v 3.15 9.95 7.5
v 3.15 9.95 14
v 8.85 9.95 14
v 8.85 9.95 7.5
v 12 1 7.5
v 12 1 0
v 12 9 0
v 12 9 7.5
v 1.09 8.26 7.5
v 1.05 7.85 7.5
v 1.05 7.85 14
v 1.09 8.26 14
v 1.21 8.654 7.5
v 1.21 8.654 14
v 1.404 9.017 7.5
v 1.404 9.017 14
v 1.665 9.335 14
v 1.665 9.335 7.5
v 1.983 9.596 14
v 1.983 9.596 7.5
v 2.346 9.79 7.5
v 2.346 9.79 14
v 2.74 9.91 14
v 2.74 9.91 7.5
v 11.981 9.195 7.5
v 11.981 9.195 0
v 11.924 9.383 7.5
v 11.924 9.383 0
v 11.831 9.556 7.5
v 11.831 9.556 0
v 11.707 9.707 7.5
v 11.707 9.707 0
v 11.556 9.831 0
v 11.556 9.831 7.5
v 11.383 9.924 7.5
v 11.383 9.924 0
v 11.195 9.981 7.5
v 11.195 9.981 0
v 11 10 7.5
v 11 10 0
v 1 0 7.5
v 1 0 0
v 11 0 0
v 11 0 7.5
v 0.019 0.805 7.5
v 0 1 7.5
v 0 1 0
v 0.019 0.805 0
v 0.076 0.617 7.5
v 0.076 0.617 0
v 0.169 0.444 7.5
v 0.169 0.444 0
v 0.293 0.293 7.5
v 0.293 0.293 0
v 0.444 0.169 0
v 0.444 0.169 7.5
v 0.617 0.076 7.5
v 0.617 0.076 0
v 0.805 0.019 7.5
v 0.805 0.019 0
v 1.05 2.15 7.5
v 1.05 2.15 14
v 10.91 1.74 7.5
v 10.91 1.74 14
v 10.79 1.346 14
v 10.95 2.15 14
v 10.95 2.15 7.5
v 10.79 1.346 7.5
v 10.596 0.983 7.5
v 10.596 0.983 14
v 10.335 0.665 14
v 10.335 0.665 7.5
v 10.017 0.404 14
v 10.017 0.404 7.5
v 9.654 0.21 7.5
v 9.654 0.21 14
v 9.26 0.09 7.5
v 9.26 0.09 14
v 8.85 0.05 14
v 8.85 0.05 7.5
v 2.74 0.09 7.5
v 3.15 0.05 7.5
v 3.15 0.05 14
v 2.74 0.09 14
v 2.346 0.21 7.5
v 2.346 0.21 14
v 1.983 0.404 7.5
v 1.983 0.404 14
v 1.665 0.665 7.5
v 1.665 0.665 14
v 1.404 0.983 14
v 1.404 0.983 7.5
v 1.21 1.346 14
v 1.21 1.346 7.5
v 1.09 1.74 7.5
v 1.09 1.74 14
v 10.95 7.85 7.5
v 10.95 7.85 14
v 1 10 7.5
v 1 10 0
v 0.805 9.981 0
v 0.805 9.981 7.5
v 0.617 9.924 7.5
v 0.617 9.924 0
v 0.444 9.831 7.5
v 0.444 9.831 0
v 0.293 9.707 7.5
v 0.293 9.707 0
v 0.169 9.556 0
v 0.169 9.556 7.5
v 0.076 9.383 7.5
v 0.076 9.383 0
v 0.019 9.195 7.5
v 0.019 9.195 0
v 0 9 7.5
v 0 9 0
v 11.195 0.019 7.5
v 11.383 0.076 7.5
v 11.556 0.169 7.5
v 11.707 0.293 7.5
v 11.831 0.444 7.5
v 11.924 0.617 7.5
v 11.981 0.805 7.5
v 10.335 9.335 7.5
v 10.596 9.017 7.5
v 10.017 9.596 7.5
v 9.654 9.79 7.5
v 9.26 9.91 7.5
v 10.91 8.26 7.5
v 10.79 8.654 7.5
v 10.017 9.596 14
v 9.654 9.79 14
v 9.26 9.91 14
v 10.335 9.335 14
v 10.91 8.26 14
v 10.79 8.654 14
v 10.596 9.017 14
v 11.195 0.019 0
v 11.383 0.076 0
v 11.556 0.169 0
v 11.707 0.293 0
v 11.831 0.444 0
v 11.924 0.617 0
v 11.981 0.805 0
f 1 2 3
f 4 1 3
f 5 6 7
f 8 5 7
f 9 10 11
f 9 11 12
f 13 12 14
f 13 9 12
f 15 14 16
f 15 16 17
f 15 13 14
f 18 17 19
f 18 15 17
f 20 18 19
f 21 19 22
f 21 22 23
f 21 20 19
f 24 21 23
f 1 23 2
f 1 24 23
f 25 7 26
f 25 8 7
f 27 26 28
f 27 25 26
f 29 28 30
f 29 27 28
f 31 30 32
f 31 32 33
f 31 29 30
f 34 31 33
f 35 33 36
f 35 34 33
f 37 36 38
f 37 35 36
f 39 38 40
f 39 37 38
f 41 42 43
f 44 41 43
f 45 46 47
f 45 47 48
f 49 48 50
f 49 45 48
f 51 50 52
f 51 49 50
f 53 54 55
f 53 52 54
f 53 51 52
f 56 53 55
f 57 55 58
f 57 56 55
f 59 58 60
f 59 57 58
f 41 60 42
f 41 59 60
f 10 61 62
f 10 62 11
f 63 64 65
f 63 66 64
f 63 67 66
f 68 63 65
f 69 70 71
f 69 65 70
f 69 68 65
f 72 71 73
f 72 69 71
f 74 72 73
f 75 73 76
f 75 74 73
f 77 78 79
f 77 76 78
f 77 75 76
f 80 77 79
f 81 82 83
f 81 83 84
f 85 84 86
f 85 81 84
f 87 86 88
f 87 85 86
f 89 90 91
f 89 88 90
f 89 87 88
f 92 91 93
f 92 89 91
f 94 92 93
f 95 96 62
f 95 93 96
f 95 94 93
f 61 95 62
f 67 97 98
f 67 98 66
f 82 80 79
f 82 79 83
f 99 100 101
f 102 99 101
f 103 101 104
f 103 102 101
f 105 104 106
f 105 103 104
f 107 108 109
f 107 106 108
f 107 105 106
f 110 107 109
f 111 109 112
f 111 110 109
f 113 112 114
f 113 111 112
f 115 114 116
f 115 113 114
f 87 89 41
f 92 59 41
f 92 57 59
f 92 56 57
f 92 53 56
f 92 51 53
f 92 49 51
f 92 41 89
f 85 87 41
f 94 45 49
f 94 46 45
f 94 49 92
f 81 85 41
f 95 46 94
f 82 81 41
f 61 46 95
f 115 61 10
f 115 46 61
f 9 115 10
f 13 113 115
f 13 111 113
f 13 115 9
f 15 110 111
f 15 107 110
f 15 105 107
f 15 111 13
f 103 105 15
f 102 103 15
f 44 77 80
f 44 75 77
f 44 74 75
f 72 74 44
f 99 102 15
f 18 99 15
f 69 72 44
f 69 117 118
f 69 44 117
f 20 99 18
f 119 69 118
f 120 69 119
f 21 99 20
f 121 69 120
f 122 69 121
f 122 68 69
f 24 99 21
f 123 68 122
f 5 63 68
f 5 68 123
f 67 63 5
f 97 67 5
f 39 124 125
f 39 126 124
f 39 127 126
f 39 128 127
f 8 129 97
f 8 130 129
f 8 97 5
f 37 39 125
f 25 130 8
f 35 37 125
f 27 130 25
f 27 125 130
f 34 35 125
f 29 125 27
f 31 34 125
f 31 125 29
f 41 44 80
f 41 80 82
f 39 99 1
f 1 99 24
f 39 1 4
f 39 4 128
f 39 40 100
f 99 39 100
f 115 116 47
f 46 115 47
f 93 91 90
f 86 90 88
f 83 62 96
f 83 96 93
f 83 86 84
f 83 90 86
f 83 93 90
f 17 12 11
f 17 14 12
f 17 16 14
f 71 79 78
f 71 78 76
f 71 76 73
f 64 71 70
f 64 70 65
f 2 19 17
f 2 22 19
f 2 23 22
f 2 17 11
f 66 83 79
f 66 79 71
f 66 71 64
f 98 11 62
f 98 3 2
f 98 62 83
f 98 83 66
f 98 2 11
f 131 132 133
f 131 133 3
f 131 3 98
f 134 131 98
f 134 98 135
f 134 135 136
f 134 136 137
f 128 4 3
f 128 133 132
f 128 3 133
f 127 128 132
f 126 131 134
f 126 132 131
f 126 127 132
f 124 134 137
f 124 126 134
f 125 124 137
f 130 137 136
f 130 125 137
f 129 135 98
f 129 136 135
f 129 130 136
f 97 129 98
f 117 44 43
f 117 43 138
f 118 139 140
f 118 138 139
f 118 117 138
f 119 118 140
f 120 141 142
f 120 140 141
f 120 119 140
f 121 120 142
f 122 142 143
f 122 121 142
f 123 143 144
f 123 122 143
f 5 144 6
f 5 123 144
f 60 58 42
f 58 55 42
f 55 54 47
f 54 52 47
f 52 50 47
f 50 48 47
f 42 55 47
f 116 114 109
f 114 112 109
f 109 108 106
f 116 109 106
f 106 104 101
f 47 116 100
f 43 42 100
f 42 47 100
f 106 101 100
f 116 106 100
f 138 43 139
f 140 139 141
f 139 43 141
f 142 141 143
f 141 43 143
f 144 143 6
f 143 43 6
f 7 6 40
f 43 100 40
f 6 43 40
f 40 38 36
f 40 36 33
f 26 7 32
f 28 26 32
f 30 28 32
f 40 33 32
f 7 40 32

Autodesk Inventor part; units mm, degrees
ref_plane "YZ Plane" through (0, 0, 0) normal (1, 0, 0) x (0, 1, 0)
ref_plane "XZ Plane" through (0, 0, 0) normal (0, 1, 0) x (-1, 0, 0)
ref_plane "XY Plane" through (0, 0, 0) normal (0, 0, 1) x (1, 0, 0)
sketch "Skizze1" plane through (0, 0, 0) normal (0, 0, 1) x (1, 0, 0)
  line L0 (0, 0) -> (12, 0)
  line L1 (12, 0) -> (12, 10)
  line L2 (12, 10) -> (0, 10)
  line L3 (0, 10) -> (0, 0)
  dimension "d0" = 12
  dimension "d1" = 10
extrude "Extrusion1" add sketch "Skizze1" along normal blind 14
sketch "Skizze2" plane through (0, 0, 14) normal (0, 0, 1) x (1, 0, 0)
  line L0 (1.05, 9.95) -> (10.95, 9.95)
  line L1 (10.95, 9.95) -> (10.95, 0.05)
  line L2 (10.95, 0.05) -> (1.05, 0.05)
  line L3 (1.05, 0.05) -> (1.05, 9.95)
  line L4 (12, 10) -> (0, 10) projected
  line L5 (0, 10) -> (0, 0) projected
  line L6 (0, 0) -> (12, 0) projected
  line L7 (0, 10) -> (12, 10)
  line L8 (12, 10) -> (12, 0)
  line L9 (12, 0) -> (0, 0)
  line L10 (0, 0) -> (0, 10)
  point P0 (6, 9.95)
  point P1 (6, 10)
  point P2 (1.05, 5)
  point P3 (0, 5)
  dimension "d4" = 9.9
  dimension "d5" = 9.9
extrude "Extrusion2" cut sketch "Skizze2" against normal blind 6.5
fillet "Rundung1" radius 2.1 4 edges at (1.05, 0.05, 10.75) (10.95, 0.05, 10.75) (10.95, 9.95, 10.75) (1.05, 9.95, 10.75)
fillet "Rundung2" radius 1 4 edges at (0, 0, 3.75) (0, 10, 3.75) (12, 0, 3.75) (12, 10, 3.75)
properties part number "Taster"
